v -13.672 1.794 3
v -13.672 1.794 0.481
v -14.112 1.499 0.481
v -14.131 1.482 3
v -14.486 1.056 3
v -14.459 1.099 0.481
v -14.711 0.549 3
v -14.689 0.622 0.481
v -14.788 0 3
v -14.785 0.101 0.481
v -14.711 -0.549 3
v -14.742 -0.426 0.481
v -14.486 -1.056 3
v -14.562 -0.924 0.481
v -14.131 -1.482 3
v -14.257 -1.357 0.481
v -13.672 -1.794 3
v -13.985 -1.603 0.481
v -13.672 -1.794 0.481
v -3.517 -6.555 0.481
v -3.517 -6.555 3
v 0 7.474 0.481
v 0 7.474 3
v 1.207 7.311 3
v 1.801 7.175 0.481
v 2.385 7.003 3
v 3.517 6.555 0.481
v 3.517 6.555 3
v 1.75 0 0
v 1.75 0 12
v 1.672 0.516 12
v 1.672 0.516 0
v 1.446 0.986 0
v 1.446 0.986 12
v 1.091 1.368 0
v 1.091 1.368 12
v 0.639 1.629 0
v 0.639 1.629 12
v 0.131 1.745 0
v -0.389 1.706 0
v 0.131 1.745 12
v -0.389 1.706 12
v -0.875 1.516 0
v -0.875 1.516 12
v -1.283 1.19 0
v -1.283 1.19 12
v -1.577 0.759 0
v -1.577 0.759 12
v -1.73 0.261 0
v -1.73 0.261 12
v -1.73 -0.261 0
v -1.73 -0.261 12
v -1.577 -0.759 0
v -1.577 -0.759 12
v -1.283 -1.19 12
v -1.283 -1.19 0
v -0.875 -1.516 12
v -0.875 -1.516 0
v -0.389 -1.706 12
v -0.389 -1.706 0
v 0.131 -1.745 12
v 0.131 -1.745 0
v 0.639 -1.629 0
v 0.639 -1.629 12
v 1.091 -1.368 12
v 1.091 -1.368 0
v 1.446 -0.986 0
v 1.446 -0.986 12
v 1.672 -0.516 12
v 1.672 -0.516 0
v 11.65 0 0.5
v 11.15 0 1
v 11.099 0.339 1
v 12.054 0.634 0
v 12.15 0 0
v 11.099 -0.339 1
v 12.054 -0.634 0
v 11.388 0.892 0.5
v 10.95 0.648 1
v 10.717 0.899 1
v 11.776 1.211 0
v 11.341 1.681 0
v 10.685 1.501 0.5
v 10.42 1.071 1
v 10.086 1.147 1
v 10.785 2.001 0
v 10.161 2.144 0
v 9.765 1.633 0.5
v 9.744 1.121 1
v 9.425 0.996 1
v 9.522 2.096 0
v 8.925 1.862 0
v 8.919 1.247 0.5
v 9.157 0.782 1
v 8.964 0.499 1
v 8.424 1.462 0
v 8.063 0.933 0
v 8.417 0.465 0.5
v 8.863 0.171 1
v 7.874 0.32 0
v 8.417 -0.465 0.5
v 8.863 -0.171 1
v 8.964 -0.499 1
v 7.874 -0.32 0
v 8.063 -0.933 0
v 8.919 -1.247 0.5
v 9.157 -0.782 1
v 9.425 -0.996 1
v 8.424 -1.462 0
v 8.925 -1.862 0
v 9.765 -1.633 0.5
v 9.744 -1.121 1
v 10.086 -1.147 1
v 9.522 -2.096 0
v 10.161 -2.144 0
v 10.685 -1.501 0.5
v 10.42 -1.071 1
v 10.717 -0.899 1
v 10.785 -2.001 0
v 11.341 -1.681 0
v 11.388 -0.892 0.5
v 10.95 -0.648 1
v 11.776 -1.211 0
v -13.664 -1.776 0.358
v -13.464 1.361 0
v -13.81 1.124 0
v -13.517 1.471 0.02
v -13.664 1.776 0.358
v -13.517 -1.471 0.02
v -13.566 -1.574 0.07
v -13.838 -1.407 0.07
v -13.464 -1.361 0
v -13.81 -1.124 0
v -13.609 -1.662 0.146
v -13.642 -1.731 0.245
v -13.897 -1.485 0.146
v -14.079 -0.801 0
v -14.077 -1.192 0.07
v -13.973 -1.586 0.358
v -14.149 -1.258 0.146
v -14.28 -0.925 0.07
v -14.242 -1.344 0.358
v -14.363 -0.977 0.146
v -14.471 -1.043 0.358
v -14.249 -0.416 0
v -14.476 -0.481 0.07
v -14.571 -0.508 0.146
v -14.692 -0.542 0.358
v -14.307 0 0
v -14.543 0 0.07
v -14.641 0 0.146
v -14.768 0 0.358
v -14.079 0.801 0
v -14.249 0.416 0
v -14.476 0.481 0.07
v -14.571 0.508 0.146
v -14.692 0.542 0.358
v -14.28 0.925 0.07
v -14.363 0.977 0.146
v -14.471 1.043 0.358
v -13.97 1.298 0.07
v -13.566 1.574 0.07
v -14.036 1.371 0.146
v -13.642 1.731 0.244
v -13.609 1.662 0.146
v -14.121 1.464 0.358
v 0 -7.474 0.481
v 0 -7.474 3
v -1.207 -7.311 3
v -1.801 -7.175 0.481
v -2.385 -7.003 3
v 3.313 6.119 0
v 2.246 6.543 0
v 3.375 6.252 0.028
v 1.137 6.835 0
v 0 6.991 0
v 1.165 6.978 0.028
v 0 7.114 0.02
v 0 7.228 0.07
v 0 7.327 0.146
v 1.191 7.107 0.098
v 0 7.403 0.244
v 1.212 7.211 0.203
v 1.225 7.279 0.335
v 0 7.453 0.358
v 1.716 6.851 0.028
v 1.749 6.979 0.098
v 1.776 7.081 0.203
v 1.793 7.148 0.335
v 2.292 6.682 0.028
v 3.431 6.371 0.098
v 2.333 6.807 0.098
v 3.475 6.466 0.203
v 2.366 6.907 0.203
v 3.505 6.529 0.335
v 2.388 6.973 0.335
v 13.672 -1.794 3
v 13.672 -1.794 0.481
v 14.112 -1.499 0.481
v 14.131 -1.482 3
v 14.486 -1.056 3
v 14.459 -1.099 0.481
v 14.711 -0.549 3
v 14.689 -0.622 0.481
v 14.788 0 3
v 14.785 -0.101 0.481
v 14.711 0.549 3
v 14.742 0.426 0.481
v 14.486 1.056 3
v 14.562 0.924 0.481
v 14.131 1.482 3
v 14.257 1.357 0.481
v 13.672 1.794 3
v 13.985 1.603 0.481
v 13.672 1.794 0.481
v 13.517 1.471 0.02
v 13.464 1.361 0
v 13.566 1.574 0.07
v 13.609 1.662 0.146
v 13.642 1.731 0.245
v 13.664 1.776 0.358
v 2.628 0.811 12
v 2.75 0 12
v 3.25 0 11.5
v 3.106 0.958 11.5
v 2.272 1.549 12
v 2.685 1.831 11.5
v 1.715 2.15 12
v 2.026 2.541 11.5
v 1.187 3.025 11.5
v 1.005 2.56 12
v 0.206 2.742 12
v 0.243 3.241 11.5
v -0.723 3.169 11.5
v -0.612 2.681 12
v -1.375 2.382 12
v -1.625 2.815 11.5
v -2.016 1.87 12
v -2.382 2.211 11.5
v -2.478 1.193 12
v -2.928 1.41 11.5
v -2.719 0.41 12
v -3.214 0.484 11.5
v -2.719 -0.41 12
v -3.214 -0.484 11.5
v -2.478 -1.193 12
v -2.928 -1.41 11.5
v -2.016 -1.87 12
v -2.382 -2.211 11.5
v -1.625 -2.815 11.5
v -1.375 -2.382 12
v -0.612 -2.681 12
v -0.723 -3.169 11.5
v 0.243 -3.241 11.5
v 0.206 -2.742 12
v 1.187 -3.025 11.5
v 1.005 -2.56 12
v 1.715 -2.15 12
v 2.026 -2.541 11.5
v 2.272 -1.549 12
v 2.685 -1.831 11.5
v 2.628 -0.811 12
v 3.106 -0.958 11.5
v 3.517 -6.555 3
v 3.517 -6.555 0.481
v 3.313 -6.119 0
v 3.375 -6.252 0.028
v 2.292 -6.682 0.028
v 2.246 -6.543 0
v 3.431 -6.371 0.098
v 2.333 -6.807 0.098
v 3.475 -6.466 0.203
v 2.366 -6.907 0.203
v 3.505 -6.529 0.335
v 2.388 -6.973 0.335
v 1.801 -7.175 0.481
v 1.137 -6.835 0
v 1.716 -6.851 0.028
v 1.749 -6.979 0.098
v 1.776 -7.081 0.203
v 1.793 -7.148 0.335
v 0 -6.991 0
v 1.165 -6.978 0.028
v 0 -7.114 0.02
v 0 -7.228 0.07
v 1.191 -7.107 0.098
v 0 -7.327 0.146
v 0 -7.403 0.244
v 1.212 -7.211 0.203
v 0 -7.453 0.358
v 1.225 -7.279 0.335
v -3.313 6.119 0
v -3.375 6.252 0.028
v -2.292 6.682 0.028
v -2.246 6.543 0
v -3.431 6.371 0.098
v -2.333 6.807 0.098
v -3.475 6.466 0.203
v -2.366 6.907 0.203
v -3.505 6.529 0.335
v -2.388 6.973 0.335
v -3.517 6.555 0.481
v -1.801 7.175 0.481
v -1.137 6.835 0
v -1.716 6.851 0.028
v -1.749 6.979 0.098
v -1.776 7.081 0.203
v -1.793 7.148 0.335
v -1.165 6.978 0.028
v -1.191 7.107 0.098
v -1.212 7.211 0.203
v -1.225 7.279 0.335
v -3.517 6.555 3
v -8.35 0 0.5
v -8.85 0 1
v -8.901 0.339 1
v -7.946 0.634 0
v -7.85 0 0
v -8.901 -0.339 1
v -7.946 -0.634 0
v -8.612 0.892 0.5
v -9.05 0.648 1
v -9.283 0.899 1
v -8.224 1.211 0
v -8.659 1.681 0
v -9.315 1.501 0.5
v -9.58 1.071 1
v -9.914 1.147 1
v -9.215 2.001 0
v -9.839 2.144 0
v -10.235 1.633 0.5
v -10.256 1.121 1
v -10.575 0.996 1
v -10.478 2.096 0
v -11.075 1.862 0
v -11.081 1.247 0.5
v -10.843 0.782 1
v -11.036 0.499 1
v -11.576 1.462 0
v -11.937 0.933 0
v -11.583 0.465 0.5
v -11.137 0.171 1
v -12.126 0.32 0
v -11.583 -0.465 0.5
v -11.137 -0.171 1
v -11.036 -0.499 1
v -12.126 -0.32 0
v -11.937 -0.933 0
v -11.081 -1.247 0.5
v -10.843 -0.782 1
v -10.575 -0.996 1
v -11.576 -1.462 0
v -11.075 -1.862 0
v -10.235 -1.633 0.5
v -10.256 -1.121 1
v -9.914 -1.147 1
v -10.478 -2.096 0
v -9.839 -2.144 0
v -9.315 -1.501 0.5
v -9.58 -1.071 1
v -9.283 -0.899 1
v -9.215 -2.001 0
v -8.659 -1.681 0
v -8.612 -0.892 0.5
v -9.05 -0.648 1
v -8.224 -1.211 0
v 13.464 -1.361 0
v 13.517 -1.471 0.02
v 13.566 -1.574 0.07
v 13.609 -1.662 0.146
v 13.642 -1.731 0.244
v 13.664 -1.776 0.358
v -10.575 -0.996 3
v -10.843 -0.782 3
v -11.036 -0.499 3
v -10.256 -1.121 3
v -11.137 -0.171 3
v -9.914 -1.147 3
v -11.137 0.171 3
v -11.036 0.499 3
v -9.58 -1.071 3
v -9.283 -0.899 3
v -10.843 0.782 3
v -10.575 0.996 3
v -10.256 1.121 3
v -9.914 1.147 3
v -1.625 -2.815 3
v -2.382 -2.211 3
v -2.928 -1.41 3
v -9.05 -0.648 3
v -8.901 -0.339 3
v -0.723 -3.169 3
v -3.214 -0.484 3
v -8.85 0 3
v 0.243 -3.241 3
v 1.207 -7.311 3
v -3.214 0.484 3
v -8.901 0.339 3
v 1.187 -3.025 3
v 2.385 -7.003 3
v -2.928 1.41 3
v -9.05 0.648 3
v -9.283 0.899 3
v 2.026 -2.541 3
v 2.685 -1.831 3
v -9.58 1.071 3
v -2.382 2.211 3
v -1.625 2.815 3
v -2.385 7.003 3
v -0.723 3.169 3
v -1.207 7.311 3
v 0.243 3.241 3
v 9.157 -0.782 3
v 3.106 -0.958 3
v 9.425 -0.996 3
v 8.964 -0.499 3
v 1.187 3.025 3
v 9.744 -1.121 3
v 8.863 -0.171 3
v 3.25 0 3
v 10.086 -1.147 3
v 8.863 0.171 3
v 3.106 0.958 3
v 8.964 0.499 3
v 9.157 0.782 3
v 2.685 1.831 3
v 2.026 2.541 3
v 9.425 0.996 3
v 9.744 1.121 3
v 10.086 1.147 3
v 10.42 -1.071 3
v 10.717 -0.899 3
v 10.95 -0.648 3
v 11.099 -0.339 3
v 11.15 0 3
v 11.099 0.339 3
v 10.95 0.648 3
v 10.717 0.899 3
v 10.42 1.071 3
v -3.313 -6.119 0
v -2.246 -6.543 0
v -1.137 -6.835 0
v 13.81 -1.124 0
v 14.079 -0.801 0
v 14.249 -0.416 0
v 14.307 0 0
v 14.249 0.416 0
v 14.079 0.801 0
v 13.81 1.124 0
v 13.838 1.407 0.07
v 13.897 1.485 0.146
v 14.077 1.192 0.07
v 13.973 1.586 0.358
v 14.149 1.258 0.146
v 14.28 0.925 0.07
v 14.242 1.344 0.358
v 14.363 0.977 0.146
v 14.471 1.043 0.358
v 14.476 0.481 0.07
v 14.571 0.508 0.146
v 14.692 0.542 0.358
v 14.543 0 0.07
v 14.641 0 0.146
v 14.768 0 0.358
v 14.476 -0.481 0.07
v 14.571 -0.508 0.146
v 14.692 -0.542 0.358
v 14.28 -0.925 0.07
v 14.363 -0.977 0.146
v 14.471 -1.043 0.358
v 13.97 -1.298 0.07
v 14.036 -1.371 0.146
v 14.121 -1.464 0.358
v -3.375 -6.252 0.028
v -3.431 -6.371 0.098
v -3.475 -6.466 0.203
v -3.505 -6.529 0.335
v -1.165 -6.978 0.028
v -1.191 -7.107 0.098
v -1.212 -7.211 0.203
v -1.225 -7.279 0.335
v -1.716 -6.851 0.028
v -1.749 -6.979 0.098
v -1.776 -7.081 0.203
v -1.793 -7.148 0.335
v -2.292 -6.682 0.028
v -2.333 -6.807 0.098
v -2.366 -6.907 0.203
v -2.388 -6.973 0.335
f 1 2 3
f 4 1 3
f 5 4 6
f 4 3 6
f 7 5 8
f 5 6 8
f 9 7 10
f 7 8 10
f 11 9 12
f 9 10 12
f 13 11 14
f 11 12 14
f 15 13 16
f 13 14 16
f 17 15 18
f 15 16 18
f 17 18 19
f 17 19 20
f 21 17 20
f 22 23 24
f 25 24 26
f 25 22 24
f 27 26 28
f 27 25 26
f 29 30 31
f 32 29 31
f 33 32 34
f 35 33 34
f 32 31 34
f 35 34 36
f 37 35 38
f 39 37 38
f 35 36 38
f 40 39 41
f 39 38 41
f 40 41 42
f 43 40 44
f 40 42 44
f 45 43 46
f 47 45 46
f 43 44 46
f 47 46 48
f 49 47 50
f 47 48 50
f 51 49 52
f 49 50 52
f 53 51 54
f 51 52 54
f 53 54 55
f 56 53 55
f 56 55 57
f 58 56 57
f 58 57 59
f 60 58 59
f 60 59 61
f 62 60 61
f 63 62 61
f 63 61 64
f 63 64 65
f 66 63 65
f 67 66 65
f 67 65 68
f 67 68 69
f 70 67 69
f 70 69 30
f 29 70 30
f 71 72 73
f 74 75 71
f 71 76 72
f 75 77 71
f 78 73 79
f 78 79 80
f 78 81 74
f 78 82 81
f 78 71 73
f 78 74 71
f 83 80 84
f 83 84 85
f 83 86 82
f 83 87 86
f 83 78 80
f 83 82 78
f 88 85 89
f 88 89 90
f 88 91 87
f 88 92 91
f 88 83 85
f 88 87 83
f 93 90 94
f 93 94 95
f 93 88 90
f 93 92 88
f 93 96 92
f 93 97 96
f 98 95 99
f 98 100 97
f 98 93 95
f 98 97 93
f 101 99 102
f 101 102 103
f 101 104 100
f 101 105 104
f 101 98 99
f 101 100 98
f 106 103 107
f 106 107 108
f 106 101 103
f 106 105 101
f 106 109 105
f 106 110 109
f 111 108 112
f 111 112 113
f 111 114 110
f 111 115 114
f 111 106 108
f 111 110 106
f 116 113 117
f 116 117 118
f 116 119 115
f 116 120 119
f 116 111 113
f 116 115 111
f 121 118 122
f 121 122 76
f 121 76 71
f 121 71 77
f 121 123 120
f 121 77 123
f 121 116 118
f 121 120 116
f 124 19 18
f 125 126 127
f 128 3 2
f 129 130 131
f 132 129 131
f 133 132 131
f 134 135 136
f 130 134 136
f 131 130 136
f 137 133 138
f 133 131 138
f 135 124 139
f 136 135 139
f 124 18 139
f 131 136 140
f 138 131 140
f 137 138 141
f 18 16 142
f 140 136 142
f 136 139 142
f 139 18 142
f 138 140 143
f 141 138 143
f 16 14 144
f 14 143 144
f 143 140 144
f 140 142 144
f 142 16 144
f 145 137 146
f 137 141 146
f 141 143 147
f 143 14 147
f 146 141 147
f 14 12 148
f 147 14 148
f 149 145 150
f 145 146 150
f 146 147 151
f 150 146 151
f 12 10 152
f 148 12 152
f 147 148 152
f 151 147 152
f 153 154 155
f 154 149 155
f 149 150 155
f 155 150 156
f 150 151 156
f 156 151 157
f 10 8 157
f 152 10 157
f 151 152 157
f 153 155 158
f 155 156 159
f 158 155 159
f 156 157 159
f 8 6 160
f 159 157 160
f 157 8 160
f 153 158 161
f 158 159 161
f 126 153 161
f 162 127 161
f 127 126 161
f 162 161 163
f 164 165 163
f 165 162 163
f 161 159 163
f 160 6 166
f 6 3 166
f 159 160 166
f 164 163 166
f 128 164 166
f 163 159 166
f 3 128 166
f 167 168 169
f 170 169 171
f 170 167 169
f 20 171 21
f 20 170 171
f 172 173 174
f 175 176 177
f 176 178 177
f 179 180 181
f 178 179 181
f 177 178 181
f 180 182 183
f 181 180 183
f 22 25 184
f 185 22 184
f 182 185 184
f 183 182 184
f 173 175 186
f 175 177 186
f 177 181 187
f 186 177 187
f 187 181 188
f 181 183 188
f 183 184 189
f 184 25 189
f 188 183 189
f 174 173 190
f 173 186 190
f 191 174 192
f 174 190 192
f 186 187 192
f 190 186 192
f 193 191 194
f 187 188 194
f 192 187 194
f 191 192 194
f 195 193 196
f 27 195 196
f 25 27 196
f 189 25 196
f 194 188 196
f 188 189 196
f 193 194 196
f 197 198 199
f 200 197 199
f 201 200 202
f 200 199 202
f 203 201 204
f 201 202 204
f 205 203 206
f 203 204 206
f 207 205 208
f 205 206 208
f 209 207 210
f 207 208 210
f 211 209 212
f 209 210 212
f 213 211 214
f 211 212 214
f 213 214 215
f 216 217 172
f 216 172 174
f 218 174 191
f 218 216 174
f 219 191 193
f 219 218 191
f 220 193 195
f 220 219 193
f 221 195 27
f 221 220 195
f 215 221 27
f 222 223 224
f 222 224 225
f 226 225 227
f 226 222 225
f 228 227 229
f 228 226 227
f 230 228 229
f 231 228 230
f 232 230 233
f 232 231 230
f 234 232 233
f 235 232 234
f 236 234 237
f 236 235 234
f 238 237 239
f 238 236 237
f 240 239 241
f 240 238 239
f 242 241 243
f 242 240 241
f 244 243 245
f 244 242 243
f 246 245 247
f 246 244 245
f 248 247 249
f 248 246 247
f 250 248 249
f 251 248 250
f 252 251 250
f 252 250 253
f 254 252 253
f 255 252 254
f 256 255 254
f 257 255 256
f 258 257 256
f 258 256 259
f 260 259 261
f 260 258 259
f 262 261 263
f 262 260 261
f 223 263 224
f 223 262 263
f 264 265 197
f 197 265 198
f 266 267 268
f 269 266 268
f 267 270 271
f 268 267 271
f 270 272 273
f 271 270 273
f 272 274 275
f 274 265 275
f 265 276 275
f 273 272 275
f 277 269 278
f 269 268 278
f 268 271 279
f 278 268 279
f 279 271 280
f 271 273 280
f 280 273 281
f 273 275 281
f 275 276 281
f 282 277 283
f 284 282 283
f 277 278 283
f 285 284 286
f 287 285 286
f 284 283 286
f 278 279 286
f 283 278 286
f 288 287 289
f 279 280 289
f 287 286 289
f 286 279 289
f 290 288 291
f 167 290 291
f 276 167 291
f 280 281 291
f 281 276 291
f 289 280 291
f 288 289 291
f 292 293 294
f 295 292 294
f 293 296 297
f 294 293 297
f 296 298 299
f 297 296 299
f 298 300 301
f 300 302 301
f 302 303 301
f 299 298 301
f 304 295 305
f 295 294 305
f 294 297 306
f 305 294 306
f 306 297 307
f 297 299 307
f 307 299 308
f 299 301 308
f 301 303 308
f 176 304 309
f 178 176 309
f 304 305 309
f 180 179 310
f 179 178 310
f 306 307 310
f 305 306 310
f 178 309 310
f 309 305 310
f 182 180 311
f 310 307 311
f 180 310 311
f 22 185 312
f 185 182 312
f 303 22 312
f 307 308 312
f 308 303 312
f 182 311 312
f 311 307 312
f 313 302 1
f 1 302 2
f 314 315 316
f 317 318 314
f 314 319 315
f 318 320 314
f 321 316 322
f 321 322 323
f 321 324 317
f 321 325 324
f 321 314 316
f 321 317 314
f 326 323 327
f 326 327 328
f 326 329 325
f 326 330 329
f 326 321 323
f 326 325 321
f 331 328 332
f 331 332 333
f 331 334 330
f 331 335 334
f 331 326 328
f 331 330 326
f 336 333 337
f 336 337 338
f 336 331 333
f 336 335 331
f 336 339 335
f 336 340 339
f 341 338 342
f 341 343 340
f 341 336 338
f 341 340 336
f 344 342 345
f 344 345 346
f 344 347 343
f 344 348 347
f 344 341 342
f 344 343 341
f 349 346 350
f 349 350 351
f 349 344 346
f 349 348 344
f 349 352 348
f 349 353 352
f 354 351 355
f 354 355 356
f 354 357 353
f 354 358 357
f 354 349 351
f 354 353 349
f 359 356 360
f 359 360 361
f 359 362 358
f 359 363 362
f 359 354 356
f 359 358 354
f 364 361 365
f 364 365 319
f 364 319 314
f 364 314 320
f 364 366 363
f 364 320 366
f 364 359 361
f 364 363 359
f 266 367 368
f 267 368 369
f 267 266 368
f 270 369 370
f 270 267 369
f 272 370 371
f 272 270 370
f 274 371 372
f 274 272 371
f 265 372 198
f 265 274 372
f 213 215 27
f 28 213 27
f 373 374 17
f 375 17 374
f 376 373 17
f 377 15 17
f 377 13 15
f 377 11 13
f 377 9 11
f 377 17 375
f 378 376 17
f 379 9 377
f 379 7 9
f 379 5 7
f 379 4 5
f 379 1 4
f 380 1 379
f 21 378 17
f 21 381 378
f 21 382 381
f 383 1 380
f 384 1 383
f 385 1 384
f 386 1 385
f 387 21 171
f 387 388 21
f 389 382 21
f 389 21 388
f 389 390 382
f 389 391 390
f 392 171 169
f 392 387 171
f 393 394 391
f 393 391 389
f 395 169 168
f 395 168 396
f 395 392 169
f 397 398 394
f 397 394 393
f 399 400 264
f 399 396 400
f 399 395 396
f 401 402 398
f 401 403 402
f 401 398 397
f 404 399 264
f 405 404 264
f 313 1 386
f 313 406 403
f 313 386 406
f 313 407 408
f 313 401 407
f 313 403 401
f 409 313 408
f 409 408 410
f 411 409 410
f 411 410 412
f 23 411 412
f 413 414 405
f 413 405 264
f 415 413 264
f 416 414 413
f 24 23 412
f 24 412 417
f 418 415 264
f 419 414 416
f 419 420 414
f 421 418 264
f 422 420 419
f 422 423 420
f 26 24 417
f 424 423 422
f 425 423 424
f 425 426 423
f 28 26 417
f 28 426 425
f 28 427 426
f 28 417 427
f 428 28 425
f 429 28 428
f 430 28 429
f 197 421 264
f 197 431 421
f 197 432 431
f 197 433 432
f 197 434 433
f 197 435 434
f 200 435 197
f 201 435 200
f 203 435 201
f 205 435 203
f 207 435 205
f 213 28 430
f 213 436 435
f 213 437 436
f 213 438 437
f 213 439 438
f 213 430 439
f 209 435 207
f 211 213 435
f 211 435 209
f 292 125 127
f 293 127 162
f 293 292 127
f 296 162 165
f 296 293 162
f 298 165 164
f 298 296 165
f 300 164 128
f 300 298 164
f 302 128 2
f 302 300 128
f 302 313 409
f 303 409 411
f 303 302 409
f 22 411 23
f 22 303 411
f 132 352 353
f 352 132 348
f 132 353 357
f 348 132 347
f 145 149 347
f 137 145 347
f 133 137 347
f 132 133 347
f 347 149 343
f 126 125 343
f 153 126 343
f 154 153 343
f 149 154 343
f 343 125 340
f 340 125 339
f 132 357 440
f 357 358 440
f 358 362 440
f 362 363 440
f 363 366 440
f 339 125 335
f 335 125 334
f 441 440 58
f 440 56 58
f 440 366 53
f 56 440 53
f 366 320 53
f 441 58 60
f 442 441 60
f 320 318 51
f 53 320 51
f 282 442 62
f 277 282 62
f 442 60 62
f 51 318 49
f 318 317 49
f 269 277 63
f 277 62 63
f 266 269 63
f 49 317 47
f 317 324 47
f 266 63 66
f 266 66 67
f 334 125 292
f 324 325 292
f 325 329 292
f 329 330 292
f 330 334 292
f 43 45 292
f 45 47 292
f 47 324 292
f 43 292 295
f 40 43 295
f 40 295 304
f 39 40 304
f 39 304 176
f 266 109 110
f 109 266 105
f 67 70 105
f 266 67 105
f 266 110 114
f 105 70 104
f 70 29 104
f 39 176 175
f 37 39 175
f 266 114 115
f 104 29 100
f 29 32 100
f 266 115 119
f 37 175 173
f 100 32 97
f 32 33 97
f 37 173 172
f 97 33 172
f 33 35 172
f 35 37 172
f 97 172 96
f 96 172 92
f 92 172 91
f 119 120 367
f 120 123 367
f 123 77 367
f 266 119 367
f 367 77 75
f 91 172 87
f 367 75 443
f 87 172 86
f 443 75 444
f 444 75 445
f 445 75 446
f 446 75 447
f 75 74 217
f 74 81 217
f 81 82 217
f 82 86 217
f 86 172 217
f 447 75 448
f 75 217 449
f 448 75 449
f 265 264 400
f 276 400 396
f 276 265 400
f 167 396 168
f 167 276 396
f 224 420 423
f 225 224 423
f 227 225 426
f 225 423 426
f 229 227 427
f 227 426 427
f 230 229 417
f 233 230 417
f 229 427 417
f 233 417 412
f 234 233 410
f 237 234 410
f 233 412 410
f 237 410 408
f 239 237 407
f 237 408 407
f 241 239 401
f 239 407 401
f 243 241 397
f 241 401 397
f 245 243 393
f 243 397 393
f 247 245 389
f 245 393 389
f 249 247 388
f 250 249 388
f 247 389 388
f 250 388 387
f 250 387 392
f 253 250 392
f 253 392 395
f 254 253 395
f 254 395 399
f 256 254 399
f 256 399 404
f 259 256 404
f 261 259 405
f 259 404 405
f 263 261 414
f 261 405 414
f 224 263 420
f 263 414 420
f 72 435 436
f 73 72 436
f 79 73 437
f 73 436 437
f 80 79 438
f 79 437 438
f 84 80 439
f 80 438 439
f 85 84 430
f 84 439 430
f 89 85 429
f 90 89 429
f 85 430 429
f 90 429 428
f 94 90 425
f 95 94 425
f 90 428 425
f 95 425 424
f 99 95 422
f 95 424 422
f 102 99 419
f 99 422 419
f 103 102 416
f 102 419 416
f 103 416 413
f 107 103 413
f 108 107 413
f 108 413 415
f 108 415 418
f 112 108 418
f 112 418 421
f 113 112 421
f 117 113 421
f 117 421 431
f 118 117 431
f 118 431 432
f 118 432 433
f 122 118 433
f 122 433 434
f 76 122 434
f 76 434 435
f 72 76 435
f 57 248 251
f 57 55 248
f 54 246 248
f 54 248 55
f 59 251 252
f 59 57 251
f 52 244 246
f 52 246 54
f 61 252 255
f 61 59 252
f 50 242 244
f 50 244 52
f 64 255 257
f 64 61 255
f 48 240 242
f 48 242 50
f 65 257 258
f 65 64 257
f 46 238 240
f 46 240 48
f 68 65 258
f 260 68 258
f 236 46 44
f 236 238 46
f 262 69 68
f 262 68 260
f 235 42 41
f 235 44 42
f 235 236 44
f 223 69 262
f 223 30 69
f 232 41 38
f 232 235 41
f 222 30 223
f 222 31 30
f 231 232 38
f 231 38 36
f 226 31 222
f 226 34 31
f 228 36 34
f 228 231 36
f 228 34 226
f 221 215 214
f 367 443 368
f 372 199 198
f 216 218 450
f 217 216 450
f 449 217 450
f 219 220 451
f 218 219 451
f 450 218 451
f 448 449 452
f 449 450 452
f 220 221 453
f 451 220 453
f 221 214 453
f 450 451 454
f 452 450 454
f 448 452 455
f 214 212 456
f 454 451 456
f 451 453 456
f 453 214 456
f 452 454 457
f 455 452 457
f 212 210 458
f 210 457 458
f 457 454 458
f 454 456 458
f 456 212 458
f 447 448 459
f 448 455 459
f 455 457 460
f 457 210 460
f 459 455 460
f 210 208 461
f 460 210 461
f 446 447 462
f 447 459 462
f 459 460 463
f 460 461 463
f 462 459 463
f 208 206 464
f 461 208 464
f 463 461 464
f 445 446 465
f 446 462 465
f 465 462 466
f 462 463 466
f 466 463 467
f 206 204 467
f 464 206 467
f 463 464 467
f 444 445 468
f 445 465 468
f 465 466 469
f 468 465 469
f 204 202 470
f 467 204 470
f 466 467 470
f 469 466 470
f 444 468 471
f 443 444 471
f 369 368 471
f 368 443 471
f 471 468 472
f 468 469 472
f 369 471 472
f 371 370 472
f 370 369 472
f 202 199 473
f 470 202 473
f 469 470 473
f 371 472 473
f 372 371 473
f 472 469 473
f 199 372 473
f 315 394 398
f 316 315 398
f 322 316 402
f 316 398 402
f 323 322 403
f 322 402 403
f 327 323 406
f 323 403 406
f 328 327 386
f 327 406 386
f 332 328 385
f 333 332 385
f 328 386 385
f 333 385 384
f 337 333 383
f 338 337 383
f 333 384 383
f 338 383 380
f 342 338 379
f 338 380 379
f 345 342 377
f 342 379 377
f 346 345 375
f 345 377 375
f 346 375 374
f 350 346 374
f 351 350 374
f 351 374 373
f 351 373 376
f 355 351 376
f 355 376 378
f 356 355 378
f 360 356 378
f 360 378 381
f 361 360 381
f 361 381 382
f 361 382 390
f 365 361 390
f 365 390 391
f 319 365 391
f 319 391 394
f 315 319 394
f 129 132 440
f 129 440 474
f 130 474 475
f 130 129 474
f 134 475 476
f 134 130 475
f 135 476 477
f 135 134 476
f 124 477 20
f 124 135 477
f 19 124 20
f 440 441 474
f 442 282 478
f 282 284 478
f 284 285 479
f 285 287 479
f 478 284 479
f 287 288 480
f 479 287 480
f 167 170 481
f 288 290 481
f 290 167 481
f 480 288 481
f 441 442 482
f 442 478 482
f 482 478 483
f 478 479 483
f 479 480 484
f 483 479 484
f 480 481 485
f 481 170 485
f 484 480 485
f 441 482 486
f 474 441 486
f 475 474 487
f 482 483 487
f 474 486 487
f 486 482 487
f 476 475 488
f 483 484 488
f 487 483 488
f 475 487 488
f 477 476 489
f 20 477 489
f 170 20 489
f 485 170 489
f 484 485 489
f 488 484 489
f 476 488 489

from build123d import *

# Parameters (mm, degrees)
F1_DEPTH      = 3
F2_T1_DEPTH   = 24.3364797517
F3_T1_DEPTH   = 14.1373136471
F4_R          = 3.25
F5_DEPTH      = 9
F6_R          = 1.75
F7_DEPTH      = 12.001
F8_SIZE       = 0.5
F4_R_2        = 1.15
F9_DEPTH      = 3.001
F10_SIZE      = 1
F11_T1_DEPTH  = 11.2158433332
F11_T3_DEPTH  = 11.2158433332
F11_T5_DEPTH  = 11.2158433332
F11_T7_DEPTH  = 11.2158433332
F11_T10_ANGLE = 127.4788590763
F11_T12_ANGLE = 42.4709850422
F11_T14_ANGLE = 42.4709850422
F11_T16_ANGLE = 42.4709850422
F11_T18_ANGLE = 42.4709850422
F11_T20_ANGLE = 127.4788590763


# Not quite as in the source:
# - a fillet or chamfer that OpenCascade refuses, or shapes differently, is made with other operations: its cross-section is extruded or revolved along the edge and cut away or added


with BuildPart() as f1:
    # F0 (on Top) → F1 (new body)
    with BuildSketch(Plane.XY):
        Polygon((-1.5, 7.5), (-17.5, 0), (-1.5, -7.5), (1.5, -7.5), (17.5, 0), (1.5, 7.5), align=None)
    extrude(amount=F1_DEPTH)

    # F2: fillet of radius 2 on 2 edges, made by hand

    # F2_s2 → F2_t1 (cut)
    with BuildSketch(Plane.XY.offset(-10.6682398759)):
        with BuildLine():
            ThreePointArc((-13.6363085399, 1.8115471368), (-14.7878407874, 0), (-13.6363085399, -1.8115471368))
            Line((-13.6363085399, -1.8115471368), (-13.7212248119, -1.9927018505))
            ThreePointArc((-13.7212248119, -1.9927018505), (-15.6529856552, -1.0867471903), (-17.584916272, -0.1811547137))
            Line((-17.584916272, -0.1811547137), (-17.584916272, 0.1811547137))
            ThreePointArc((-17.584916272, 0.1811547137), (-15.6529856552, 1.0867471903), (-13.7212248119, 1.9927018505))
            Line((-13.7212248119, 1.9927018505), (-13.6363085399, 1.8115471368))
        make_face()
        with BuildLine():
            ThreePointArc((13.6363085399, -1.8115471368), (14.7878407874, 0), (13.6363085399, 1.8115471368))
            Line((13.6363085399, 1.8115471368), (13.7212248119, 1.9927018505))
            ThreePointArc((13.7212248119, 1.9927018505), (15.6529856552, 1.0867471903), (17.584916272, 0.1811547137))
            Line((17.584916272, 0.1811547137), (17.584916272, -0.1811547137))
            ThreePointArc((17.584916272, -0.1811547137), (15.6529856552, -1.0867471903), (13.7212248119, -1.9927018505))
            Line((13.7212248119, -1.9927018505), (13.6363085399, -1.8115471368))
        make_face()
    extrude(amount=F2_T1_DEPTH, mode=Mode.SUBTRACT)

    # F3: fillet of radius 10 on 4 edges, made by hand

    # F3_s2 → F3_t1 (cut)
    with BuildSketch(Plane.XY.offset(-5.5686568236)):
        with BuildLine():
            ThreePointArc((-3.5168760329, 6.5545893596), (-1.4467160125, 7.2607861772), (0.7274627294, 7.5))
            Line((0.7274627294, 7.5), (-1.5, 7.5))
            Line((-1.5, 7.5), (-3.5168760329, 6.5545893596))
        make_face()
        with BuildLine():
            ThreePointArc((-0.7274627294, 7.5), (1.4467160125, 7.2607861772), (3.5168760329, 6.5545893596))
            Line((3.5168760329, 6.5545893596), (1.5, 7.5))
            Line((1.5, 7.5), (-0.7274627294, 7.5))
        make_face()
        with BuildLine():
            ThreePointArc((3.5168760329, -6.5545893596), (1.4467160125, -7.2607861772), (-0.7274627294, -7.5))
            Line((-0.7274627294, -7.5), (1.5, -7.5))
            Line((1.5, -7.5), (3.5168760329, -6.5545893596))
        make_face()
        with BuildLine():
            ThreePointArc((0.7274627294, -7.5), (-1.4467160125, -7.2607861772), (-3.5168760329, -6.5545893596))
            Line((-3.5168760329, -6.5545893596), (-1.5, -7.5))
            Line((-1.5, -7.5), (0.7274627294, -7.5))
        make_face()
    extrude(amount=F3_T1_DEPTH, mode=Mode.SUBTRACT)

    # F4 (on face) → F5 (join)
    with BuildSketch(Plane.XY.offset(3)):
        Circle(F4_R)
    extrude(amount=F5_DEPTH)

    # F6 (on face) → F7 (cut, through all)
    with BuildSketch(Plane.XY.offset(12)):
        Circle(F6_R)
    extrude(amount=-F7_DEPTH, mode=Mode.SUBTRACT)

    # F8
    f8_edges = [f1.edges().sort_by_distance(p)[0] for p in [
        (-3.25, 0, 12),
    ]]
    chamfer(f8_edges, length=F8_SIZE)

    # F4 (on face) → F9 (cut, through all)
    with BuildSketch(Plane.XY.offset(3)):
        with Locations((-10, 0)):
            Circle(F4_R_2)
        with Locations((10, 0)):
            Circle(F4_R_2)
    extrude(amount=-F9_DEPTH, mode=Mode.SUBTRACT)

    # F10
    f10_edges = [f1.edges().sort_by_distance(p)[0] for p in [
        (-11.15, 0, 0),
        (8.85, 0, 0),
    ]]
    chamfer(f10_edges, length=F10_SIZE)

    # F11: fillet of radius 0.5 on 10 edges, made by hand

    # F11_s2 → F11_t1 (cut)
    with BuildSketch(Plane(origin=(-10.5198395857, 4.9311748058, 0), x_dir=(0, 0, 1), z_dir=(0.905458936, -0.4244338762, 0))):
        with BuildLine():
            ThreePointArc((-0.0004, 6.9266271486), (0.1464466094, 7.2811462246), (0.5009656854, 7.427992834))
            Line((0.5009656854, 7.427992834), (0.5009656854, 7.4781294026))
            ThreePointArc((0.5009656854, 7.4781294026), (0.2504828427, 7.4777294026), (0, 7.4777294026))
            Line((0, 7.4777294026), (-0.0501365685, 7.427592834))
            ThreePointArc((-0.0501365685, 7.427592834), (-0.0501365685, 7.1771099913), (-0.0505365685, 6.9266271486))
            Line((-0.0505365685, 6.9266271486), (-0.0004, 6.9266271486))
        make_face()
    extrude(amount=F11_T1_DEPTH, mode=Mode.SUBTRACT)

    # F11_s4 → F11_t3 (cut)
    with BuildSketch(Plane(origin=(0.3643540153, 0.1707909447, 0), x_dir=(0, 0, 1), z_dir=(0.905458936, 0.4244338762, 0))):
        with BuildLine():
            ThreePointArc((-0.0004, 6.9266271486), (0.1464466094, 7.2811462246), (0.5009656854, 7.427992834))
            Line((0.5009656854, 7.427992834), (0.5009656854, 7.4781294026))
            ThreePointArc((0.5009656854, 7.4781294026), (0.2504828427, 7.4777294026), (0, 7.4777294026))
            Line((0, 7.4777294026), (-0.0501365685, 7.427592834))
            ThreePointArc((-0.0501365685, 7.427592834), (-0.0501365685, 7.1771099913), (-0.0505365685, 6.9266271486))
            Line((-0.0505365685, 6.9266271486), (-0.0004, 6.9266271486))
        make_face()
    extrude(amount=F11_T3_DEPTH, mode=Mode.SUBTRACT)

    # F11_s6 → F11_t5 (cut)
    with BuildSketch(Plane(origin=(10.5198395857, -4.9311748058, 0), x_dir=(0, 0, 1), z_dir=(-0.905458936, 0.4244338762, 0))):
        with BuildLine():
            ThreePointArc((-0.0004, 6.9266271486), (0.1464466094, 7.2811462246), (0.5009656854, 7.427992834))
            Line((0.5009656854, 7.427992834), (0.5009656854, 7.4781294026))
            ThreePointArc((0.5009656854, 7.4781294026), (0.2504828427, 7.4777294026), (0, 7.4777294026))
            Line((0, 7.4777294026), (-0.0501365685, 7.427592834))
            ThreePointArc((-0.0501365685, 7.427592834), (-0.0501365685, 7.1771099913), (-0.0505365685, 6.9266271486))
            Line((-0.0505365685, 6.9266271486), (-0.0004, 6.9266271486))
        make_face()
    extrude(amount=F11_T5_DEPTH, mode=Mode.SUBTRACT)

    # F11_s8 → F11_t7 (cut)
    with BuildSketch(Plane(origin=(-0.3643540153, -0.1707909447, 0), x_dir=(0, 0, 1), z_dir=(-0.905458936, -0.4244338762, 0))):
        with BuildLine():
            ThreePointArc((-0.0004, 6.9266271486), (0.1464466094, 7.2811462246), (0.5009656854, 7.427992834))
            Line((0.5009656854, 7.427992834), (0.5009656854, 7.4781294026))
            ThreePointArc((0.5009656854, 7.4781294026), (0.2504828427, 7.4777294026), (0, 7.4777294026))
            Line((0, 7.4777294026), (-0.0501365685, 7.427592834))
            ThreePointArc((-0.0501365685, 7.427592834), (-0.0501365685, 7.1771099913), (-0.0505365685, 6.9266271486))
            Line((-0.0505365685, 6.9266271486), (-0.0004, 6.9266271486))
        make_face()
    extrude(amount=F11_T7_DEPTH, mode=Mode.SUBTRACT)

    # F11_s9 → F11_t10 (revolve, cut)
    with BuildSketch(Plane(origin=(10.283861632, -5.0737982035, 0), x_dir=(0, 0, 1), z_dir=(-0.8967911287, 0.4424541462, 0))):
        with BuildLine():
            ThreePointArc((-0.0004, 7.157454968), (0.1464466094, 7.511974044), (0.5009656854, 7.6588206534))
            Line((0.5009656854, 7.6588206534), (0.5009656854, 7.708957222))
            ThreePointArc((0.5009656854, 7.708957222), (0.2504828427, 7.708557222), (0, 7.708557222))
            Line((0, 7.708557222), (-0.0501365685, 7.6584206534))
            ThreePointArc((-0.0501365685, 7.6584206534), (-0.0501365685, 7.4079378107), (-0.0505365685, 7.157454968))
            Line((-0.0505365685, 7.157454968), (-0.0004, 7.157454968))
        make_face()
    revolve(axis=Axis((12.7871458195, 0, 0), (0, 0, -1)), revolution_arc=F11_T10_ANGLE, mode=Mode.SUBTRACT)

    # F11_s11 → F11_t12 (revolve, cut)
    with BuildSketch(Plane(origin=(-1.3745464916, -0.429601751, 0), x_dir=(0, 0, 1), z_dir=(-0.9544689122, -0.2983104016, 0))):
        with BuildLine():
            ThreePointArc((-0.0004, 7.3298717335), (0.1464466094, 7.6843908095), (0.5009656854, 7.8312374189))
            Line((0.5009656854, 7.8312374189), (0.5009656854, 7.8813739874))
            ThreePointArc((0.5009656854, 7.8813739874), (0.2504828427, 7.8809739874), (0, 7.8809739874))
            Line((0, 7.8809739874), (-0.0501365685, 7.8308374189))
            ThreePointArc((-0.0501365685, 7.8308374189), (-0.0501365685, 7.5803545762), (-0.0505365685, 7.3298717335))
            Line((-0.0505365685, 7.3298717335), (-0.0004, 7.3298717335))
        make_face()
    revolve(axis=Axis((-0.72746273, -2.5000000027, 0), (0, 0, -1)), revolution_arc=F11_T12_ANGLE, mode=Mode.SUBTRACT)

    # F11_s13 → F11_t14 (revolve, cut)
    with BuildSketch(Plane(origin=(-0.3643540157, -0.1707909448, 0), x_dir=(0, 0, 1), z_dir=(-0.905458936, -0.4244338762, 0))):
        with BuildLine():
            ThreePointArc((-0.0004, 6.9266271486), (0.1464466094, 7.2811462246), (0.5009656854, 7.427992834))
            Line((0.5009656854, 7.427992834), (0.5009656854, 7.4781294026))
            ThreePointArc((0.5009656854, 7.4781294026), (0.2504828427, 7.4777294026), (0, 7.4777294026))
            Line((0, 7.4777294026), (-0.0501365685, 7.427592834))
            ThreePointArc((-0.0501365685, 7.427592834), (-0.0501365685, 7.1771099913), (-0.0505365685, 6.9266271486))
            Line((-0.0505365685, 6.9266271486), (-0.0004, 6.9266271486))
        make_face()
    revolve(axis=Axis((0.72746273, -2.5000000027, 0), (0, 0, -1)), revolution_arc=F11_T14_ANGLE, mode=Mode.SUBTRACT)

    # F11_s15 → F11_t16 (revolve, cut)
    with BuildSketch(Plane(origin=(0.3643540157, 0.1707909448, 0), x_dir=(0, 0, 1), z_dir=(0.905458936, 0.4244338762, 0))):
        with BuildLine():
            ThreePointArc((-0.0004, 6.9266271486), (0.1464466094, 7.2811462246), (0.5009656854, 7.427992834))
            Line((0.5009656854, 7.427992834), (0.5009656854, 7.4781294026))
            ThreePointArc((0.5009656854, 7.4781294026), (0.2504828427, 7.4777294026), (0, 7.4777294026))
            Line((0, 7.4777294026), (-0.0501365685, 7.427592834))
            ThreePointArc((-0.0501365685, 7.427592834), (-0.0501365685, 7.1771099913), (-0.0505365685, 6.9266271486))
            Line((-0.0505365685, 6.9266271486), (-0.0004, 6.9266271486))
        make_face()
    revolve(axis=Axis((-0.72746273, 2.5000000027, 0), (0, 0, -1)), revolution_arc=F11_T16_ANGLE, mode=Mode.SUBTRACT)

    # F11_s17 → F11_t18 (revolve, cut)
    with BuildSketch(Plane(origin=(1.3745464916, 0.429601751, 0), x_dir=(0, 0, 1), z_dir=(0.9544689122, 0.2983104016, 0))):
        with BuildLine():
            ThreePointArc((-0.0004, 7.3298717335), (0.1464466094, 7.6843908095), (0.5009656854, 7.8312374189))
            Line((0.5009656854, 7.8312374189), (0.5009656854, 7.8813739874))
            ThreePointArc((0.5009656854, 7.8813739874), (0.2504828427, 7.8809739874), (0, 7.8809739874))
            Line((0, 7.8809739874), (-0.0501365685, 7.8308374189))
            ThreePointArc((-0.0501365685, 7.8308374189), (-0.0501365685, 7.5803545762), (-0.0505365685, 7.3298717335))
            Line((-0.0505365685, 7.3298717335), (-0.0004, 7.3298717335))
        make_face()
    revolve(axis=Axis((0.72746273, 2.5000000027, 0), (0, 0, -1)), revolution_arc=F11_T18_ANGLE, mode=Mode.SUBTRACT)

    # F11_s19 → F11_t20 (revolve, cut)
    with BuildSketch(Plane(origin=(-10.283861632, 5.0737982035, 0), x_dir=(0, 0, 1), z_dir=(0.8967911287, -0.4424541462, 0))):
        with BuildLine():
            ThreePointArc((-0.0004, 7.157454968), (0.1464466094, 7.511974044), (0.5009656854, 7.6588206534))
            Line((0.5009656854, 7.6588206534), (0.5009656854, 7.708957222))
            ThreePointArc((0.5009656854, 7.708957222), (0.2504828427, 7.708557222), (0, 7.708557222))
            Line((0, 7.708557222), (-0.0501365685, 7.6584206534))
            ThreePointArc((-0.0501365685, 7.6584206534), (-0.0501365685, 7.4079378107), (-0.0505365685, 7.157454968))
            Line((-0.0505365685, 7.157454968), (-0.0004, 7.157454968))
        make_face()
    revolve(axis=Axis((-12.7871458195, 0, 0), (0, 0, -1)), revolution_arc=F11_T20_ANGLE, mode=Mode.SUBTRACT)


solid = f1.part
